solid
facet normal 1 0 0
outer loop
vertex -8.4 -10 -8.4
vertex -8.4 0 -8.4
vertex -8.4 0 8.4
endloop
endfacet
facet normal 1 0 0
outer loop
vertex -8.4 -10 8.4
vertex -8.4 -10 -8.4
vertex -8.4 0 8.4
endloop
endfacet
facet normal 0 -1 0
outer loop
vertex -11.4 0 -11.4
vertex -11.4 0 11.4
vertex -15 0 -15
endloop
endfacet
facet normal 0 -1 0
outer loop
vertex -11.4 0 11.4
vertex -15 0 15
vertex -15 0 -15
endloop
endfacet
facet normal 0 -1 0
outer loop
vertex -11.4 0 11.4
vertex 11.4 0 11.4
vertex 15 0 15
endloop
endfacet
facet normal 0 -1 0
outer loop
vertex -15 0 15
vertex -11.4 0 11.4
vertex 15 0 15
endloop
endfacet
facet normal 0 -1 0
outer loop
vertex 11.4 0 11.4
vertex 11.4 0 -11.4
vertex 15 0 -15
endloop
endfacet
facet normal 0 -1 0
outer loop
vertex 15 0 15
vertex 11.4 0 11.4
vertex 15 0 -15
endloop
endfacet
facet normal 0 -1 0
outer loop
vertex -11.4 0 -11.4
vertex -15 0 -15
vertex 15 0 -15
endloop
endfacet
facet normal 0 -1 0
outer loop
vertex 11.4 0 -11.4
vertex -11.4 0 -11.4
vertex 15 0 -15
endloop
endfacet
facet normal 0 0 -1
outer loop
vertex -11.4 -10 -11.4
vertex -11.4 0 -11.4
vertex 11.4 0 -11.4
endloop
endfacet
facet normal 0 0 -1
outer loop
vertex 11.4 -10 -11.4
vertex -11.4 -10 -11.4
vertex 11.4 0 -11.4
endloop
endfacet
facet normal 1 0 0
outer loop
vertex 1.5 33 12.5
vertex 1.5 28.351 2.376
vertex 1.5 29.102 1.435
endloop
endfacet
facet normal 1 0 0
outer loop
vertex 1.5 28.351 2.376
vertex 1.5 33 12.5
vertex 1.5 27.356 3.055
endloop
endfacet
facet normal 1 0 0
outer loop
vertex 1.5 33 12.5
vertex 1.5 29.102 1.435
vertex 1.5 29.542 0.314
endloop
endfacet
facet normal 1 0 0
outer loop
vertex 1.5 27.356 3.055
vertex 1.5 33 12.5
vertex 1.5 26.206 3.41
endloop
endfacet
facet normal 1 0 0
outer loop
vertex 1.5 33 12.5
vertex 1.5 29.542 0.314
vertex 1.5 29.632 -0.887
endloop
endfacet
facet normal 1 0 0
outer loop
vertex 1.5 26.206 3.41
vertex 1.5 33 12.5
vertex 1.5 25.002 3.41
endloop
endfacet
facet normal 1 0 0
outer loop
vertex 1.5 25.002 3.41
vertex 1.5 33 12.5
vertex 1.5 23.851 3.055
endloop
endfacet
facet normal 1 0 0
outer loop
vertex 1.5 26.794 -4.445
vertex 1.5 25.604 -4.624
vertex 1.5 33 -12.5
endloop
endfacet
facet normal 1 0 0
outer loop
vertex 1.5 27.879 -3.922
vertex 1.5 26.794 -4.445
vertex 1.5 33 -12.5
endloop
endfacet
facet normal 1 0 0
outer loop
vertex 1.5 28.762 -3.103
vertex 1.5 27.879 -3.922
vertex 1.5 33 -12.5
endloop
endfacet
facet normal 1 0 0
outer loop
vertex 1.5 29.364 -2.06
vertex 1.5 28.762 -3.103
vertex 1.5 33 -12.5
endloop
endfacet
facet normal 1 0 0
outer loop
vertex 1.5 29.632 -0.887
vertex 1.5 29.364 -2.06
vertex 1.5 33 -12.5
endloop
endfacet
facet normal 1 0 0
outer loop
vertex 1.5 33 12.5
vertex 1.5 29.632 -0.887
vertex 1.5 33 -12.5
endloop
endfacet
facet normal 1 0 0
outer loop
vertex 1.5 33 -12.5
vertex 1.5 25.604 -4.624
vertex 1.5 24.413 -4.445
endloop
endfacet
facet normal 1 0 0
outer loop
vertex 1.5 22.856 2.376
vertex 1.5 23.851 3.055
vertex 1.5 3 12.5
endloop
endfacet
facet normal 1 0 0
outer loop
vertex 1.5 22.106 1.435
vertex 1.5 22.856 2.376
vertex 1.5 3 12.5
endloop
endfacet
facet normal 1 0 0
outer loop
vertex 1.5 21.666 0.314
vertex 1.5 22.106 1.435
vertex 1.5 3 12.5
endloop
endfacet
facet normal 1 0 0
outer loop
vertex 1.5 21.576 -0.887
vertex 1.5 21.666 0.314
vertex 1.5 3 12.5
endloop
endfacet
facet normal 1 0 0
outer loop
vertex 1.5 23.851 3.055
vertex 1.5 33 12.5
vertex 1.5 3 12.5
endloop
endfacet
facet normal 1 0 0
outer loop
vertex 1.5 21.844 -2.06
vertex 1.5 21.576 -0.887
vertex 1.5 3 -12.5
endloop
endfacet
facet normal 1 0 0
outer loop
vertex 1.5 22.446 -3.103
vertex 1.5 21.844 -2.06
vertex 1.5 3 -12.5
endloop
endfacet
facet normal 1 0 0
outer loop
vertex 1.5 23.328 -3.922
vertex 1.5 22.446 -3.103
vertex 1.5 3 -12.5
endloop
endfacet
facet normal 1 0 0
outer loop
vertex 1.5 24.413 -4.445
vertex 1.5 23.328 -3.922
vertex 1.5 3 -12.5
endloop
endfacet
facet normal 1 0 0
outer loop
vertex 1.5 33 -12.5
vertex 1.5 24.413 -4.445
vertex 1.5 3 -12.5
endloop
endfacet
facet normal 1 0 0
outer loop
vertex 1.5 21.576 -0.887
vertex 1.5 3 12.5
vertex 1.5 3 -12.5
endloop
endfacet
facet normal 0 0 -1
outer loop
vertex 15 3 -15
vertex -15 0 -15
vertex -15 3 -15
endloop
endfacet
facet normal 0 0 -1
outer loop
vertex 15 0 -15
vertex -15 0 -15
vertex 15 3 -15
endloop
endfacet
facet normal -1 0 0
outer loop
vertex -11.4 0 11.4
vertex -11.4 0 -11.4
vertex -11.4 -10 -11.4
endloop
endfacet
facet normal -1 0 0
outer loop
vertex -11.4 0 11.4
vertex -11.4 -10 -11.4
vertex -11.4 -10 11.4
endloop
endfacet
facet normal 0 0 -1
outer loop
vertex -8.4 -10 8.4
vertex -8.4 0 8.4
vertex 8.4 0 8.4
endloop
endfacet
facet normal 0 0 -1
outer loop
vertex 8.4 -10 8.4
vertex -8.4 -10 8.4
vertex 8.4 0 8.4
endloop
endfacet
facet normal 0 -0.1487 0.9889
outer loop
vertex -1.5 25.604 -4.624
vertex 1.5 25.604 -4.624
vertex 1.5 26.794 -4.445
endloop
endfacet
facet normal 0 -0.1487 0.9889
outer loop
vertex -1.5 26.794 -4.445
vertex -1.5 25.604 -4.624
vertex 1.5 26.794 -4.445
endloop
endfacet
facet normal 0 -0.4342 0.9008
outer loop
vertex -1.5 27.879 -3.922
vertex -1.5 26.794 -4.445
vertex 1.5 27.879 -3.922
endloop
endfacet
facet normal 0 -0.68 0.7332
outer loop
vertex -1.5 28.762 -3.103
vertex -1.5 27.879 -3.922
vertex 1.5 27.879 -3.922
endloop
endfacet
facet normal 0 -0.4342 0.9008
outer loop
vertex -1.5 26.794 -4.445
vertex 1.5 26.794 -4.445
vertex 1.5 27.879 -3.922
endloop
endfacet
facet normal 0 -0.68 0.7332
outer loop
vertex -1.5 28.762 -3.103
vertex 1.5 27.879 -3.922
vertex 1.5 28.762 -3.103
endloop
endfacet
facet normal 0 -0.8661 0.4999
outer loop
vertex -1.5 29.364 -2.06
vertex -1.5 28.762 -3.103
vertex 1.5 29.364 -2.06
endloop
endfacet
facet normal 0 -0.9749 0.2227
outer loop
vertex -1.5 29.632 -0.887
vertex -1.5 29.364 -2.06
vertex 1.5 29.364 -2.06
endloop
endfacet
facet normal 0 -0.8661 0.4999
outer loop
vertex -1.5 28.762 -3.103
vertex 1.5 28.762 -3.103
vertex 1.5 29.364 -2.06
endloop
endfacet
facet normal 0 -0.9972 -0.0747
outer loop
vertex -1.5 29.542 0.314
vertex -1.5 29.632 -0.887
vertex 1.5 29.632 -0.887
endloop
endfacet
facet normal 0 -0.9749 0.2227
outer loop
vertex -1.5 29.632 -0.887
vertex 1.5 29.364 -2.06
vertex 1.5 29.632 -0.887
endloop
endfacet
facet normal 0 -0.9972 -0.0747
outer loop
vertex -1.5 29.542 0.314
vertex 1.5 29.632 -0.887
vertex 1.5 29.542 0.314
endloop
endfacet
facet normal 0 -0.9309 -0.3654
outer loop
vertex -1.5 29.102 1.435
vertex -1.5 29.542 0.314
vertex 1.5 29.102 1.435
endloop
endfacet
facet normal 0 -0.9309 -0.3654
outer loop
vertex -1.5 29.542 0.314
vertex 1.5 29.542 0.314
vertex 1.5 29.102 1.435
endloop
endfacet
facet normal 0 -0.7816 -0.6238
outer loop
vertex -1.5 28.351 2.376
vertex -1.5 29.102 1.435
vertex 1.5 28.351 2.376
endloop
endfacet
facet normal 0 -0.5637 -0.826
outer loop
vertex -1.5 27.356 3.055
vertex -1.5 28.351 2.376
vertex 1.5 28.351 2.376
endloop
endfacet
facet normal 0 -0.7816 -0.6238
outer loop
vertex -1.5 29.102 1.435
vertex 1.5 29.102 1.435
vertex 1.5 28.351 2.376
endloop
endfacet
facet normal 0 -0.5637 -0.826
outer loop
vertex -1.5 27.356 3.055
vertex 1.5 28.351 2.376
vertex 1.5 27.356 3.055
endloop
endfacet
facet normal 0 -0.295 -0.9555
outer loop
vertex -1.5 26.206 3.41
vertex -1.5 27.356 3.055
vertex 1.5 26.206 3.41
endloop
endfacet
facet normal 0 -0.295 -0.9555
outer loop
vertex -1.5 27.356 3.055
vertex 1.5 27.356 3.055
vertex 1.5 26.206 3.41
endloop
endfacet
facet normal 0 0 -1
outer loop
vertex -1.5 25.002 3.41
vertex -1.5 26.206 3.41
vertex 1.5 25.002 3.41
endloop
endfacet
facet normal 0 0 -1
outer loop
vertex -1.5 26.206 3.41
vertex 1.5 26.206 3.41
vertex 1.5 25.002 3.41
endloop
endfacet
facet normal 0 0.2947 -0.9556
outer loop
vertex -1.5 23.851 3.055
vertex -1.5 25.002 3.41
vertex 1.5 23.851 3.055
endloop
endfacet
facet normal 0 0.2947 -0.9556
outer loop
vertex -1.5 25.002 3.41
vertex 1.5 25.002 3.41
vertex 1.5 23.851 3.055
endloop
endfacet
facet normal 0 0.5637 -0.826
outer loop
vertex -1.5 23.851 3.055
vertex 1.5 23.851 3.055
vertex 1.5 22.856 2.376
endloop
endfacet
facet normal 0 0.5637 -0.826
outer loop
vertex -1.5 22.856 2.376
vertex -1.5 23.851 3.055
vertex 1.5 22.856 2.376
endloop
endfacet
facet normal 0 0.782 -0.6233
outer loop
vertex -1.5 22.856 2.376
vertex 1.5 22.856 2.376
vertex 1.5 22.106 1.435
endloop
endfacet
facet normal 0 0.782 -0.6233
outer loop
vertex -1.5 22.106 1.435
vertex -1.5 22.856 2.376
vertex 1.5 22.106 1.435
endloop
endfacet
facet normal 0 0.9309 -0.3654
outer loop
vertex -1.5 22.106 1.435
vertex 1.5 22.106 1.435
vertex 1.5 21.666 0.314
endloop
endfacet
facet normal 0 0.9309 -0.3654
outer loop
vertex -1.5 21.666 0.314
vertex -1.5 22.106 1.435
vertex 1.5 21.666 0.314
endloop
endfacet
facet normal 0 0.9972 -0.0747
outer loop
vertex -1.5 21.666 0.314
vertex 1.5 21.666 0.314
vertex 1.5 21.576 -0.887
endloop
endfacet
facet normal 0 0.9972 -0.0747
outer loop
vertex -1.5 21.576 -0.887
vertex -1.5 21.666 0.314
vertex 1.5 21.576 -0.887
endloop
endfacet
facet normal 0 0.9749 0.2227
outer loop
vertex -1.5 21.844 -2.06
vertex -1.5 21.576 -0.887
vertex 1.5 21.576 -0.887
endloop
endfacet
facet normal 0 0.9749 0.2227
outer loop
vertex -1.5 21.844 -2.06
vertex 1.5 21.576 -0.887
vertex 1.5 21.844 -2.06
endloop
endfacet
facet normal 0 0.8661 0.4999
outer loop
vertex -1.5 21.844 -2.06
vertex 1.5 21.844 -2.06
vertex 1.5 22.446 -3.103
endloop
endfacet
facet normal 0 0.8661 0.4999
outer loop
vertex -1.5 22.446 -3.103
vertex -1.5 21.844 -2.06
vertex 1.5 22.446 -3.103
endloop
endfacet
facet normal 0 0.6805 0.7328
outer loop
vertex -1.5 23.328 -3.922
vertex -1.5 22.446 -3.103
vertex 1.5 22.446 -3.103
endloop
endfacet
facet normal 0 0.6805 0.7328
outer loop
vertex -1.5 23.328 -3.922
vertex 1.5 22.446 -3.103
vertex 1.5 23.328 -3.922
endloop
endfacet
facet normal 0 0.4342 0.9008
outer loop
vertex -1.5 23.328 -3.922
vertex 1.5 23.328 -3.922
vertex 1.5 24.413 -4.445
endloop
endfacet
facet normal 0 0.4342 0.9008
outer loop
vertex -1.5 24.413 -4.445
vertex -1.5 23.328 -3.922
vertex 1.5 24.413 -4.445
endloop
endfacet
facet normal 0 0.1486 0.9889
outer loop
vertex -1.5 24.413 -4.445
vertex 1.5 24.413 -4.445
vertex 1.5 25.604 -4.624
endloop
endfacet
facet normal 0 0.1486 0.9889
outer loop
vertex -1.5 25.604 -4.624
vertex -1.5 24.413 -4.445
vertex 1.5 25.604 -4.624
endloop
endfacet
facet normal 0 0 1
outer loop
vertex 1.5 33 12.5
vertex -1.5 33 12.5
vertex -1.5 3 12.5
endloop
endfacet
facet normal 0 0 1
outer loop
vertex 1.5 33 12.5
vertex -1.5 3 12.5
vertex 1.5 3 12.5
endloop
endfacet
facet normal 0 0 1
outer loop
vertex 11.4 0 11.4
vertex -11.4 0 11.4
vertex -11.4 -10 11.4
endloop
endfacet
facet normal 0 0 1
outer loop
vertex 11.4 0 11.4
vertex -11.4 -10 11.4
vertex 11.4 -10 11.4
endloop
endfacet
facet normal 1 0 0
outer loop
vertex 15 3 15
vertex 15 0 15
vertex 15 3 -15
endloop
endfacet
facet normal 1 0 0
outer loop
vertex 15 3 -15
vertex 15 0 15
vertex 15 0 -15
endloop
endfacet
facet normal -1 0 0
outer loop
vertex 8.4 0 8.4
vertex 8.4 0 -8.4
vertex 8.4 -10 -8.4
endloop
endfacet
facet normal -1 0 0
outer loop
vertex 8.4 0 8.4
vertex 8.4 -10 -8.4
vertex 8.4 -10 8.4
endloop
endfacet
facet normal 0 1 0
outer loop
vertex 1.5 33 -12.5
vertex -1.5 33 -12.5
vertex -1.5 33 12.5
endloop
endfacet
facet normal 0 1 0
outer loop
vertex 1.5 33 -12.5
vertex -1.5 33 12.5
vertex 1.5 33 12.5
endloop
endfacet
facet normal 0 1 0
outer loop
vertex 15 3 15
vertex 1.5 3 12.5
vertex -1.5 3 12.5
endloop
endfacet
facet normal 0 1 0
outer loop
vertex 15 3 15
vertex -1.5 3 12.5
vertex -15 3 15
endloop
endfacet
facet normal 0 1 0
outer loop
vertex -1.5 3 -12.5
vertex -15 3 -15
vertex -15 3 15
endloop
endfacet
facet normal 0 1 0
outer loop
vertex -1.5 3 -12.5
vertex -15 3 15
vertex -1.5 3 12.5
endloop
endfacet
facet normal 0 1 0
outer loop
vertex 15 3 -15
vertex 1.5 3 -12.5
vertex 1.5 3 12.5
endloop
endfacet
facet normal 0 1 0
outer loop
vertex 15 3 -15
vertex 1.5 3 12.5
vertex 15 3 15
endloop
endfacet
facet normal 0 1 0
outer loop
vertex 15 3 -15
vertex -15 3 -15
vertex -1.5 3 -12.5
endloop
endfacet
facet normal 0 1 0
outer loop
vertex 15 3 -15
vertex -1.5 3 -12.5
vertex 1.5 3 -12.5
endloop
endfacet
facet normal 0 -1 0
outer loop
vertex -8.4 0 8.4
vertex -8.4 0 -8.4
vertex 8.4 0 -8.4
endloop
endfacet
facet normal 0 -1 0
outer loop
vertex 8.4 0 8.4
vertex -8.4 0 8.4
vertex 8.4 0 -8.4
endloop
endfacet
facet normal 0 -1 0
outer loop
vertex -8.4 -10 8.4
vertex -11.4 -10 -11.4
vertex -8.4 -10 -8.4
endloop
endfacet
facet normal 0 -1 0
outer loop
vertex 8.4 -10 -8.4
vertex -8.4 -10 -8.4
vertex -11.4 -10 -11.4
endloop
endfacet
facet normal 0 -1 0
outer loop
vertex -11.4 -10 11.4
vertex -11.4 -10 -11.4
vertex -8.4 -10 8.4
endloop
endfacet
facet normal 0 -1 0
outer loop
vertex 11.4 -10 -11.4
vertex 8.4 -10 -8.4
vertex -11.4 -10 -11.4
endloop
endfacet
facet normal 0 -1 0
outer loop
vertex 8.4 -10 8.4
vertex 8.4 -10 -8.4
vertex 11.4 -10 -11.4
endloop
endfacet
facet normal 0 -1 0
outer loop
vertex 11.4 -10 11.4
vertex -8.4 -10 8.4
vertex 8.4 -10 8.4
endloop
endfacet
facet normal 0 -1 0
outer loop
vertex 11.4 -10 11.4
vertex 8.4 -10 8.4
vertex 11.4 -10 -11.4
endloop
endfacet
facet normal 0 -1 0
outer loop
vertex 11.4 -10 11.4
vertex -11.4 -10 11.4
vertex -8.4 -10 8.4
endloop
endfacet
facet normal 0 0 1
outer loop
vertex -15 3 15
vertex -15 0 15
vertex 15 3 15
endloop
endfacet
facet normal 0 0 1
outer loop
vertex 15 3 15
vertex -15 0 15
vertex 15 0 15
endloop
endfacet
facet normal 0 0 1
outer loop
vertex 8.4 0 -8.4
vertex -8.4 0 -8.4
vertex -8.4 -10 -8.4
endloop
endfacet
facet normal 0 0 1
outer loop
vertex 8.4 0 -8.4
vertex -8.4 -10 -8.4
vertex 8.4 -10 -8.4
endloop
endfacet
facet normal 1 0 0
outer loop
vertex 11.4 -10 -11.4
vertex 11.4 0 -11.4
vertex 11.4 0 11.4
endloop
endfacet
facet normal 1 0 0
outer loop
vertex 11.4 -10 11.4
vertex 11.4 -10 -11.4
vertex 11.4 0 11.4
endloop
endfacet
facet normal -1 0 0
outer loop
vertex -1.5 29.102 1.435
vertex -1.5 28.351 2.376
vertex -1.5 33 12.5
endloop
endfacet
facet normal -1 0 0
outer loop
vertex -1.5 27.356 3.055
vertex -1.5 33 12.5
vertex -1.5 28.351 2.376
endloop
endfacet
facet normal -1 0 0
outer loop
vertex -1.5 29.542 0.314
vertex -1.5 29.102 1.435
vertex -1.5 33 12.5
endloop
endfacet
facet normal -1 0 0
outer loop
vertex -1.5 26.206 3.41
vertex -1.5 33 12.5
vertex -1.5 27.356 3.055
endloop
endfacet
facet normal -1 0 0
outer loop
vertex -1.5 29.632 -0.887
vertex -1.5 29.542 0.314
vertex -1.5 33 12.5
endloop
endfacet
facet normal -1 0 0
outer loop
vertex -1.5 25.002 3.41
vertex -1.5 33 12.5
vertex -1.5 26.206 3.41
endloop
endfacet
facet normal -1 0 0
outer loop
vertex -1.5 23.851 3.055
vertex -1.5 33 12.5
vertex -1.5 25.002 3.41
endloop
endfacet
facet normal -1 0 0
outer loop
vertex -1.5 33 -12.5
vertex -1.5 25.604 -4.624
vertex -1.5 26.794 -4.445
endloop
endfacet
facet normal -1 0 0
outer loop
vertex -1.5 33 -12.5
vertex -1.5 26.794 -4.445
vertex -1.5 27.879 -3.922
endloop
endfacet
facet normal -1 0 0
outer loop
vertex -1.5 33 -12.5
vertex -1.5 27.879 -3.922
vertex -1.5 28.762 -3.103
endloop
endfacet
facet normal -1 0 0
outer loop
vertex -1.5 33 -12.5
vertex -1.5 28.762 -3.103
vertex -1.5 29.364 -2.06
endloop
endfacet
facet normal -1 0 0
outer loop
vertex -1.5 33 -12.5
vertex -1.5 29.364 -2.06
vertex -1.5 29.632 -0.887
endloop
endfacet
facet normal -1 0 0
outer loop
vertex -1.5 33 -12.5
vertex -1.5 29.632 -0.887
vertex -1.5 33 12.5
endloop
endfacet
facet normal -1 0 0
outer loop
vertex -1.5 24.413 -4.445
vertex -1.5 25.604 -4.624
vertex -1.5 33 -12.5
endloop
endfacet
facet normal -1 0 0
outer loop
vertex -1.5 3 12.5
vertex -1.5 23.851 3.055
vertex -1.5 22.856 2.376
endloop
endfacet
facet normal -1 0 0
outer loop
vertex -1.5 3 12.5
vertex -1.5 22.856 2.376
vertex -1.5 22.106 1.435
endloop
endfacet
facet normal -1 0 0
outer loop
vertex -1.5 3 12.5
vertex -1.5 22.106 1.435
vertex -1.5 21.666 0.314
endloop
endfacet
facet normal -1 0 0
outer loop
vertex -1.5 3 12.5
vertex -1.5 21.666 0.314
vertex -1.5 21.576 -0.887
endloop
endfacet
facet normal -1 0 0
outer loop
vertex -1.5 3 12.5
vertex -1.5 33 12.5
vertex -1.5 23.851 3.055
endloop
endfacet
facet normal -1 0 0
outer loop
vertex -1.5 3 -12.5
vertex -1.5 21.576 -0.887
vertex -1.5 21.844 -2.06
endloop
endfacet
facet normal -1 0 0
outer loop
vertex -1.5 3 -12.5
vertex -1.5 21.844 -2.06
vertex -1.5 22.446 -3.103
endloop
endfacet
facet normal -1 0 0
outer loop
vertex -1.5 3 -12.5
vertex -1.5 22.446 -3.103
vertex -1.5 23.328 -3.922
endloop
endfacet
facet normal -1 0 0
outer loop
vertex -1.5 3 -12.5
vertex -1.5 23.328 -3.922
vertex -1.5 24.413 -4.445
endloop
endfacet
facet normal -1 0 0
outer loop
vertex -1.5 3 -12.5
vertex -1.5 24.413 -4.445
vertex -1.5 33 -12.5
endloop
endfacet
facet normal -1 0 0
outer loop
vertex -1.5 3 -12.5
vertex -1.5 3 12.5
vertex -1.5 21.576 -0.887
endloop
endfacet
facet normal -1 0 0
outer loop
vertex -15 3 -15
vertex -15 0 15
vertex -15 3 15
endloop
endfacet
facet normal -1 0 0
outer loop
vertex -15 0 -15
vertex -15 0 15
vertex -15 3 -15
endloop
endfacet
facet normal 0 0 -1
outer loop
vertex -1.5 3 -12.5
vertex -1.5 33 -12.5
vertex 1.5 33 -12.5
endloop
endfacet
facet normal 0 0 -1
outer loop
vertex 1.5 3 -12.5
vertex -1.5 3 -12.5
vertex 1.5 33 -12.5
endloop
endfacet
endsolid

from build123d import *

# Parameters (mm, degrees)
CROQUIS1_W              = 30
CROQUIS1_H              = 30
SALIENTE_EXTRUIR1_DEPTH = 3
CROQUIS2_W              = 3
CROQUIS2_H              = 25
SALIENTE_EXTRUIR2_DEPTH = 30
CROQUIS3_R              = 4.0394072
CORTAR_EXTRUIR1_DEPTH   = 10
CROQUIS4_W              = 22.8
CROQUIS4_H              = 22.8
CROQUIS4_W_2            = 16.8
CROQUIS4_H_2            = 16.8
SALIENTE_EXTRUIR3_DEPTH = 10


with BuildPart() as part:
    # Croquis1 → Saliente-Extruir1 (new body)
    with BuildSketch(Plane(origin=(0, 0, 0), x_dir=(1, 0, 0), z_dir=(0, 1, 0))):
        Rectangle(CROQUIS1_W, CROQUIS1_H)
    extrude(amount=SALIENTE_EXTRUIR1_DEPTH)

    # Croquis2 → Saliente-Extruir2 (add)
    with BuildSketch(Plane(origin=(0, 3, 0), x_dir=(1, 0, 0), z_dir=(0, 1, 0))):
        Rectangle(CROQUIS2_W, CROQUIS2_H)
    extrude(amount=SALIENTE_EXTRUIR2_DEPTH)

    # Croquis3 → Cortar-Extruir1 (cut)
    with BuildSketch(Plane(origin=(1.5, 0, 0), x_dir=(0, 0, -1), z_dir=(1, 0, 0))):
        with Locations((0.584677198, 25.603738422)):
            Circle(CROQUIS3_R)
    extrude(amount=-CORTAR_EXTRUIR1_DEPTH, mode=Mode.SUBTRACT)

    # Croquis4 → Saliente-Extruir3 (add)
    with BuildSketch(Plane.XZ):
        Rectangle(CROQUIS4_W, CROQUIS4_H)
        Rectangle(CROQUIS4_W_2, CROQUIS4_H_2, mode=Mode.SUBTRACT)
    extrude(amount=SALIENTE_EXTRUIR3_DEPTH)


solid = part.part
